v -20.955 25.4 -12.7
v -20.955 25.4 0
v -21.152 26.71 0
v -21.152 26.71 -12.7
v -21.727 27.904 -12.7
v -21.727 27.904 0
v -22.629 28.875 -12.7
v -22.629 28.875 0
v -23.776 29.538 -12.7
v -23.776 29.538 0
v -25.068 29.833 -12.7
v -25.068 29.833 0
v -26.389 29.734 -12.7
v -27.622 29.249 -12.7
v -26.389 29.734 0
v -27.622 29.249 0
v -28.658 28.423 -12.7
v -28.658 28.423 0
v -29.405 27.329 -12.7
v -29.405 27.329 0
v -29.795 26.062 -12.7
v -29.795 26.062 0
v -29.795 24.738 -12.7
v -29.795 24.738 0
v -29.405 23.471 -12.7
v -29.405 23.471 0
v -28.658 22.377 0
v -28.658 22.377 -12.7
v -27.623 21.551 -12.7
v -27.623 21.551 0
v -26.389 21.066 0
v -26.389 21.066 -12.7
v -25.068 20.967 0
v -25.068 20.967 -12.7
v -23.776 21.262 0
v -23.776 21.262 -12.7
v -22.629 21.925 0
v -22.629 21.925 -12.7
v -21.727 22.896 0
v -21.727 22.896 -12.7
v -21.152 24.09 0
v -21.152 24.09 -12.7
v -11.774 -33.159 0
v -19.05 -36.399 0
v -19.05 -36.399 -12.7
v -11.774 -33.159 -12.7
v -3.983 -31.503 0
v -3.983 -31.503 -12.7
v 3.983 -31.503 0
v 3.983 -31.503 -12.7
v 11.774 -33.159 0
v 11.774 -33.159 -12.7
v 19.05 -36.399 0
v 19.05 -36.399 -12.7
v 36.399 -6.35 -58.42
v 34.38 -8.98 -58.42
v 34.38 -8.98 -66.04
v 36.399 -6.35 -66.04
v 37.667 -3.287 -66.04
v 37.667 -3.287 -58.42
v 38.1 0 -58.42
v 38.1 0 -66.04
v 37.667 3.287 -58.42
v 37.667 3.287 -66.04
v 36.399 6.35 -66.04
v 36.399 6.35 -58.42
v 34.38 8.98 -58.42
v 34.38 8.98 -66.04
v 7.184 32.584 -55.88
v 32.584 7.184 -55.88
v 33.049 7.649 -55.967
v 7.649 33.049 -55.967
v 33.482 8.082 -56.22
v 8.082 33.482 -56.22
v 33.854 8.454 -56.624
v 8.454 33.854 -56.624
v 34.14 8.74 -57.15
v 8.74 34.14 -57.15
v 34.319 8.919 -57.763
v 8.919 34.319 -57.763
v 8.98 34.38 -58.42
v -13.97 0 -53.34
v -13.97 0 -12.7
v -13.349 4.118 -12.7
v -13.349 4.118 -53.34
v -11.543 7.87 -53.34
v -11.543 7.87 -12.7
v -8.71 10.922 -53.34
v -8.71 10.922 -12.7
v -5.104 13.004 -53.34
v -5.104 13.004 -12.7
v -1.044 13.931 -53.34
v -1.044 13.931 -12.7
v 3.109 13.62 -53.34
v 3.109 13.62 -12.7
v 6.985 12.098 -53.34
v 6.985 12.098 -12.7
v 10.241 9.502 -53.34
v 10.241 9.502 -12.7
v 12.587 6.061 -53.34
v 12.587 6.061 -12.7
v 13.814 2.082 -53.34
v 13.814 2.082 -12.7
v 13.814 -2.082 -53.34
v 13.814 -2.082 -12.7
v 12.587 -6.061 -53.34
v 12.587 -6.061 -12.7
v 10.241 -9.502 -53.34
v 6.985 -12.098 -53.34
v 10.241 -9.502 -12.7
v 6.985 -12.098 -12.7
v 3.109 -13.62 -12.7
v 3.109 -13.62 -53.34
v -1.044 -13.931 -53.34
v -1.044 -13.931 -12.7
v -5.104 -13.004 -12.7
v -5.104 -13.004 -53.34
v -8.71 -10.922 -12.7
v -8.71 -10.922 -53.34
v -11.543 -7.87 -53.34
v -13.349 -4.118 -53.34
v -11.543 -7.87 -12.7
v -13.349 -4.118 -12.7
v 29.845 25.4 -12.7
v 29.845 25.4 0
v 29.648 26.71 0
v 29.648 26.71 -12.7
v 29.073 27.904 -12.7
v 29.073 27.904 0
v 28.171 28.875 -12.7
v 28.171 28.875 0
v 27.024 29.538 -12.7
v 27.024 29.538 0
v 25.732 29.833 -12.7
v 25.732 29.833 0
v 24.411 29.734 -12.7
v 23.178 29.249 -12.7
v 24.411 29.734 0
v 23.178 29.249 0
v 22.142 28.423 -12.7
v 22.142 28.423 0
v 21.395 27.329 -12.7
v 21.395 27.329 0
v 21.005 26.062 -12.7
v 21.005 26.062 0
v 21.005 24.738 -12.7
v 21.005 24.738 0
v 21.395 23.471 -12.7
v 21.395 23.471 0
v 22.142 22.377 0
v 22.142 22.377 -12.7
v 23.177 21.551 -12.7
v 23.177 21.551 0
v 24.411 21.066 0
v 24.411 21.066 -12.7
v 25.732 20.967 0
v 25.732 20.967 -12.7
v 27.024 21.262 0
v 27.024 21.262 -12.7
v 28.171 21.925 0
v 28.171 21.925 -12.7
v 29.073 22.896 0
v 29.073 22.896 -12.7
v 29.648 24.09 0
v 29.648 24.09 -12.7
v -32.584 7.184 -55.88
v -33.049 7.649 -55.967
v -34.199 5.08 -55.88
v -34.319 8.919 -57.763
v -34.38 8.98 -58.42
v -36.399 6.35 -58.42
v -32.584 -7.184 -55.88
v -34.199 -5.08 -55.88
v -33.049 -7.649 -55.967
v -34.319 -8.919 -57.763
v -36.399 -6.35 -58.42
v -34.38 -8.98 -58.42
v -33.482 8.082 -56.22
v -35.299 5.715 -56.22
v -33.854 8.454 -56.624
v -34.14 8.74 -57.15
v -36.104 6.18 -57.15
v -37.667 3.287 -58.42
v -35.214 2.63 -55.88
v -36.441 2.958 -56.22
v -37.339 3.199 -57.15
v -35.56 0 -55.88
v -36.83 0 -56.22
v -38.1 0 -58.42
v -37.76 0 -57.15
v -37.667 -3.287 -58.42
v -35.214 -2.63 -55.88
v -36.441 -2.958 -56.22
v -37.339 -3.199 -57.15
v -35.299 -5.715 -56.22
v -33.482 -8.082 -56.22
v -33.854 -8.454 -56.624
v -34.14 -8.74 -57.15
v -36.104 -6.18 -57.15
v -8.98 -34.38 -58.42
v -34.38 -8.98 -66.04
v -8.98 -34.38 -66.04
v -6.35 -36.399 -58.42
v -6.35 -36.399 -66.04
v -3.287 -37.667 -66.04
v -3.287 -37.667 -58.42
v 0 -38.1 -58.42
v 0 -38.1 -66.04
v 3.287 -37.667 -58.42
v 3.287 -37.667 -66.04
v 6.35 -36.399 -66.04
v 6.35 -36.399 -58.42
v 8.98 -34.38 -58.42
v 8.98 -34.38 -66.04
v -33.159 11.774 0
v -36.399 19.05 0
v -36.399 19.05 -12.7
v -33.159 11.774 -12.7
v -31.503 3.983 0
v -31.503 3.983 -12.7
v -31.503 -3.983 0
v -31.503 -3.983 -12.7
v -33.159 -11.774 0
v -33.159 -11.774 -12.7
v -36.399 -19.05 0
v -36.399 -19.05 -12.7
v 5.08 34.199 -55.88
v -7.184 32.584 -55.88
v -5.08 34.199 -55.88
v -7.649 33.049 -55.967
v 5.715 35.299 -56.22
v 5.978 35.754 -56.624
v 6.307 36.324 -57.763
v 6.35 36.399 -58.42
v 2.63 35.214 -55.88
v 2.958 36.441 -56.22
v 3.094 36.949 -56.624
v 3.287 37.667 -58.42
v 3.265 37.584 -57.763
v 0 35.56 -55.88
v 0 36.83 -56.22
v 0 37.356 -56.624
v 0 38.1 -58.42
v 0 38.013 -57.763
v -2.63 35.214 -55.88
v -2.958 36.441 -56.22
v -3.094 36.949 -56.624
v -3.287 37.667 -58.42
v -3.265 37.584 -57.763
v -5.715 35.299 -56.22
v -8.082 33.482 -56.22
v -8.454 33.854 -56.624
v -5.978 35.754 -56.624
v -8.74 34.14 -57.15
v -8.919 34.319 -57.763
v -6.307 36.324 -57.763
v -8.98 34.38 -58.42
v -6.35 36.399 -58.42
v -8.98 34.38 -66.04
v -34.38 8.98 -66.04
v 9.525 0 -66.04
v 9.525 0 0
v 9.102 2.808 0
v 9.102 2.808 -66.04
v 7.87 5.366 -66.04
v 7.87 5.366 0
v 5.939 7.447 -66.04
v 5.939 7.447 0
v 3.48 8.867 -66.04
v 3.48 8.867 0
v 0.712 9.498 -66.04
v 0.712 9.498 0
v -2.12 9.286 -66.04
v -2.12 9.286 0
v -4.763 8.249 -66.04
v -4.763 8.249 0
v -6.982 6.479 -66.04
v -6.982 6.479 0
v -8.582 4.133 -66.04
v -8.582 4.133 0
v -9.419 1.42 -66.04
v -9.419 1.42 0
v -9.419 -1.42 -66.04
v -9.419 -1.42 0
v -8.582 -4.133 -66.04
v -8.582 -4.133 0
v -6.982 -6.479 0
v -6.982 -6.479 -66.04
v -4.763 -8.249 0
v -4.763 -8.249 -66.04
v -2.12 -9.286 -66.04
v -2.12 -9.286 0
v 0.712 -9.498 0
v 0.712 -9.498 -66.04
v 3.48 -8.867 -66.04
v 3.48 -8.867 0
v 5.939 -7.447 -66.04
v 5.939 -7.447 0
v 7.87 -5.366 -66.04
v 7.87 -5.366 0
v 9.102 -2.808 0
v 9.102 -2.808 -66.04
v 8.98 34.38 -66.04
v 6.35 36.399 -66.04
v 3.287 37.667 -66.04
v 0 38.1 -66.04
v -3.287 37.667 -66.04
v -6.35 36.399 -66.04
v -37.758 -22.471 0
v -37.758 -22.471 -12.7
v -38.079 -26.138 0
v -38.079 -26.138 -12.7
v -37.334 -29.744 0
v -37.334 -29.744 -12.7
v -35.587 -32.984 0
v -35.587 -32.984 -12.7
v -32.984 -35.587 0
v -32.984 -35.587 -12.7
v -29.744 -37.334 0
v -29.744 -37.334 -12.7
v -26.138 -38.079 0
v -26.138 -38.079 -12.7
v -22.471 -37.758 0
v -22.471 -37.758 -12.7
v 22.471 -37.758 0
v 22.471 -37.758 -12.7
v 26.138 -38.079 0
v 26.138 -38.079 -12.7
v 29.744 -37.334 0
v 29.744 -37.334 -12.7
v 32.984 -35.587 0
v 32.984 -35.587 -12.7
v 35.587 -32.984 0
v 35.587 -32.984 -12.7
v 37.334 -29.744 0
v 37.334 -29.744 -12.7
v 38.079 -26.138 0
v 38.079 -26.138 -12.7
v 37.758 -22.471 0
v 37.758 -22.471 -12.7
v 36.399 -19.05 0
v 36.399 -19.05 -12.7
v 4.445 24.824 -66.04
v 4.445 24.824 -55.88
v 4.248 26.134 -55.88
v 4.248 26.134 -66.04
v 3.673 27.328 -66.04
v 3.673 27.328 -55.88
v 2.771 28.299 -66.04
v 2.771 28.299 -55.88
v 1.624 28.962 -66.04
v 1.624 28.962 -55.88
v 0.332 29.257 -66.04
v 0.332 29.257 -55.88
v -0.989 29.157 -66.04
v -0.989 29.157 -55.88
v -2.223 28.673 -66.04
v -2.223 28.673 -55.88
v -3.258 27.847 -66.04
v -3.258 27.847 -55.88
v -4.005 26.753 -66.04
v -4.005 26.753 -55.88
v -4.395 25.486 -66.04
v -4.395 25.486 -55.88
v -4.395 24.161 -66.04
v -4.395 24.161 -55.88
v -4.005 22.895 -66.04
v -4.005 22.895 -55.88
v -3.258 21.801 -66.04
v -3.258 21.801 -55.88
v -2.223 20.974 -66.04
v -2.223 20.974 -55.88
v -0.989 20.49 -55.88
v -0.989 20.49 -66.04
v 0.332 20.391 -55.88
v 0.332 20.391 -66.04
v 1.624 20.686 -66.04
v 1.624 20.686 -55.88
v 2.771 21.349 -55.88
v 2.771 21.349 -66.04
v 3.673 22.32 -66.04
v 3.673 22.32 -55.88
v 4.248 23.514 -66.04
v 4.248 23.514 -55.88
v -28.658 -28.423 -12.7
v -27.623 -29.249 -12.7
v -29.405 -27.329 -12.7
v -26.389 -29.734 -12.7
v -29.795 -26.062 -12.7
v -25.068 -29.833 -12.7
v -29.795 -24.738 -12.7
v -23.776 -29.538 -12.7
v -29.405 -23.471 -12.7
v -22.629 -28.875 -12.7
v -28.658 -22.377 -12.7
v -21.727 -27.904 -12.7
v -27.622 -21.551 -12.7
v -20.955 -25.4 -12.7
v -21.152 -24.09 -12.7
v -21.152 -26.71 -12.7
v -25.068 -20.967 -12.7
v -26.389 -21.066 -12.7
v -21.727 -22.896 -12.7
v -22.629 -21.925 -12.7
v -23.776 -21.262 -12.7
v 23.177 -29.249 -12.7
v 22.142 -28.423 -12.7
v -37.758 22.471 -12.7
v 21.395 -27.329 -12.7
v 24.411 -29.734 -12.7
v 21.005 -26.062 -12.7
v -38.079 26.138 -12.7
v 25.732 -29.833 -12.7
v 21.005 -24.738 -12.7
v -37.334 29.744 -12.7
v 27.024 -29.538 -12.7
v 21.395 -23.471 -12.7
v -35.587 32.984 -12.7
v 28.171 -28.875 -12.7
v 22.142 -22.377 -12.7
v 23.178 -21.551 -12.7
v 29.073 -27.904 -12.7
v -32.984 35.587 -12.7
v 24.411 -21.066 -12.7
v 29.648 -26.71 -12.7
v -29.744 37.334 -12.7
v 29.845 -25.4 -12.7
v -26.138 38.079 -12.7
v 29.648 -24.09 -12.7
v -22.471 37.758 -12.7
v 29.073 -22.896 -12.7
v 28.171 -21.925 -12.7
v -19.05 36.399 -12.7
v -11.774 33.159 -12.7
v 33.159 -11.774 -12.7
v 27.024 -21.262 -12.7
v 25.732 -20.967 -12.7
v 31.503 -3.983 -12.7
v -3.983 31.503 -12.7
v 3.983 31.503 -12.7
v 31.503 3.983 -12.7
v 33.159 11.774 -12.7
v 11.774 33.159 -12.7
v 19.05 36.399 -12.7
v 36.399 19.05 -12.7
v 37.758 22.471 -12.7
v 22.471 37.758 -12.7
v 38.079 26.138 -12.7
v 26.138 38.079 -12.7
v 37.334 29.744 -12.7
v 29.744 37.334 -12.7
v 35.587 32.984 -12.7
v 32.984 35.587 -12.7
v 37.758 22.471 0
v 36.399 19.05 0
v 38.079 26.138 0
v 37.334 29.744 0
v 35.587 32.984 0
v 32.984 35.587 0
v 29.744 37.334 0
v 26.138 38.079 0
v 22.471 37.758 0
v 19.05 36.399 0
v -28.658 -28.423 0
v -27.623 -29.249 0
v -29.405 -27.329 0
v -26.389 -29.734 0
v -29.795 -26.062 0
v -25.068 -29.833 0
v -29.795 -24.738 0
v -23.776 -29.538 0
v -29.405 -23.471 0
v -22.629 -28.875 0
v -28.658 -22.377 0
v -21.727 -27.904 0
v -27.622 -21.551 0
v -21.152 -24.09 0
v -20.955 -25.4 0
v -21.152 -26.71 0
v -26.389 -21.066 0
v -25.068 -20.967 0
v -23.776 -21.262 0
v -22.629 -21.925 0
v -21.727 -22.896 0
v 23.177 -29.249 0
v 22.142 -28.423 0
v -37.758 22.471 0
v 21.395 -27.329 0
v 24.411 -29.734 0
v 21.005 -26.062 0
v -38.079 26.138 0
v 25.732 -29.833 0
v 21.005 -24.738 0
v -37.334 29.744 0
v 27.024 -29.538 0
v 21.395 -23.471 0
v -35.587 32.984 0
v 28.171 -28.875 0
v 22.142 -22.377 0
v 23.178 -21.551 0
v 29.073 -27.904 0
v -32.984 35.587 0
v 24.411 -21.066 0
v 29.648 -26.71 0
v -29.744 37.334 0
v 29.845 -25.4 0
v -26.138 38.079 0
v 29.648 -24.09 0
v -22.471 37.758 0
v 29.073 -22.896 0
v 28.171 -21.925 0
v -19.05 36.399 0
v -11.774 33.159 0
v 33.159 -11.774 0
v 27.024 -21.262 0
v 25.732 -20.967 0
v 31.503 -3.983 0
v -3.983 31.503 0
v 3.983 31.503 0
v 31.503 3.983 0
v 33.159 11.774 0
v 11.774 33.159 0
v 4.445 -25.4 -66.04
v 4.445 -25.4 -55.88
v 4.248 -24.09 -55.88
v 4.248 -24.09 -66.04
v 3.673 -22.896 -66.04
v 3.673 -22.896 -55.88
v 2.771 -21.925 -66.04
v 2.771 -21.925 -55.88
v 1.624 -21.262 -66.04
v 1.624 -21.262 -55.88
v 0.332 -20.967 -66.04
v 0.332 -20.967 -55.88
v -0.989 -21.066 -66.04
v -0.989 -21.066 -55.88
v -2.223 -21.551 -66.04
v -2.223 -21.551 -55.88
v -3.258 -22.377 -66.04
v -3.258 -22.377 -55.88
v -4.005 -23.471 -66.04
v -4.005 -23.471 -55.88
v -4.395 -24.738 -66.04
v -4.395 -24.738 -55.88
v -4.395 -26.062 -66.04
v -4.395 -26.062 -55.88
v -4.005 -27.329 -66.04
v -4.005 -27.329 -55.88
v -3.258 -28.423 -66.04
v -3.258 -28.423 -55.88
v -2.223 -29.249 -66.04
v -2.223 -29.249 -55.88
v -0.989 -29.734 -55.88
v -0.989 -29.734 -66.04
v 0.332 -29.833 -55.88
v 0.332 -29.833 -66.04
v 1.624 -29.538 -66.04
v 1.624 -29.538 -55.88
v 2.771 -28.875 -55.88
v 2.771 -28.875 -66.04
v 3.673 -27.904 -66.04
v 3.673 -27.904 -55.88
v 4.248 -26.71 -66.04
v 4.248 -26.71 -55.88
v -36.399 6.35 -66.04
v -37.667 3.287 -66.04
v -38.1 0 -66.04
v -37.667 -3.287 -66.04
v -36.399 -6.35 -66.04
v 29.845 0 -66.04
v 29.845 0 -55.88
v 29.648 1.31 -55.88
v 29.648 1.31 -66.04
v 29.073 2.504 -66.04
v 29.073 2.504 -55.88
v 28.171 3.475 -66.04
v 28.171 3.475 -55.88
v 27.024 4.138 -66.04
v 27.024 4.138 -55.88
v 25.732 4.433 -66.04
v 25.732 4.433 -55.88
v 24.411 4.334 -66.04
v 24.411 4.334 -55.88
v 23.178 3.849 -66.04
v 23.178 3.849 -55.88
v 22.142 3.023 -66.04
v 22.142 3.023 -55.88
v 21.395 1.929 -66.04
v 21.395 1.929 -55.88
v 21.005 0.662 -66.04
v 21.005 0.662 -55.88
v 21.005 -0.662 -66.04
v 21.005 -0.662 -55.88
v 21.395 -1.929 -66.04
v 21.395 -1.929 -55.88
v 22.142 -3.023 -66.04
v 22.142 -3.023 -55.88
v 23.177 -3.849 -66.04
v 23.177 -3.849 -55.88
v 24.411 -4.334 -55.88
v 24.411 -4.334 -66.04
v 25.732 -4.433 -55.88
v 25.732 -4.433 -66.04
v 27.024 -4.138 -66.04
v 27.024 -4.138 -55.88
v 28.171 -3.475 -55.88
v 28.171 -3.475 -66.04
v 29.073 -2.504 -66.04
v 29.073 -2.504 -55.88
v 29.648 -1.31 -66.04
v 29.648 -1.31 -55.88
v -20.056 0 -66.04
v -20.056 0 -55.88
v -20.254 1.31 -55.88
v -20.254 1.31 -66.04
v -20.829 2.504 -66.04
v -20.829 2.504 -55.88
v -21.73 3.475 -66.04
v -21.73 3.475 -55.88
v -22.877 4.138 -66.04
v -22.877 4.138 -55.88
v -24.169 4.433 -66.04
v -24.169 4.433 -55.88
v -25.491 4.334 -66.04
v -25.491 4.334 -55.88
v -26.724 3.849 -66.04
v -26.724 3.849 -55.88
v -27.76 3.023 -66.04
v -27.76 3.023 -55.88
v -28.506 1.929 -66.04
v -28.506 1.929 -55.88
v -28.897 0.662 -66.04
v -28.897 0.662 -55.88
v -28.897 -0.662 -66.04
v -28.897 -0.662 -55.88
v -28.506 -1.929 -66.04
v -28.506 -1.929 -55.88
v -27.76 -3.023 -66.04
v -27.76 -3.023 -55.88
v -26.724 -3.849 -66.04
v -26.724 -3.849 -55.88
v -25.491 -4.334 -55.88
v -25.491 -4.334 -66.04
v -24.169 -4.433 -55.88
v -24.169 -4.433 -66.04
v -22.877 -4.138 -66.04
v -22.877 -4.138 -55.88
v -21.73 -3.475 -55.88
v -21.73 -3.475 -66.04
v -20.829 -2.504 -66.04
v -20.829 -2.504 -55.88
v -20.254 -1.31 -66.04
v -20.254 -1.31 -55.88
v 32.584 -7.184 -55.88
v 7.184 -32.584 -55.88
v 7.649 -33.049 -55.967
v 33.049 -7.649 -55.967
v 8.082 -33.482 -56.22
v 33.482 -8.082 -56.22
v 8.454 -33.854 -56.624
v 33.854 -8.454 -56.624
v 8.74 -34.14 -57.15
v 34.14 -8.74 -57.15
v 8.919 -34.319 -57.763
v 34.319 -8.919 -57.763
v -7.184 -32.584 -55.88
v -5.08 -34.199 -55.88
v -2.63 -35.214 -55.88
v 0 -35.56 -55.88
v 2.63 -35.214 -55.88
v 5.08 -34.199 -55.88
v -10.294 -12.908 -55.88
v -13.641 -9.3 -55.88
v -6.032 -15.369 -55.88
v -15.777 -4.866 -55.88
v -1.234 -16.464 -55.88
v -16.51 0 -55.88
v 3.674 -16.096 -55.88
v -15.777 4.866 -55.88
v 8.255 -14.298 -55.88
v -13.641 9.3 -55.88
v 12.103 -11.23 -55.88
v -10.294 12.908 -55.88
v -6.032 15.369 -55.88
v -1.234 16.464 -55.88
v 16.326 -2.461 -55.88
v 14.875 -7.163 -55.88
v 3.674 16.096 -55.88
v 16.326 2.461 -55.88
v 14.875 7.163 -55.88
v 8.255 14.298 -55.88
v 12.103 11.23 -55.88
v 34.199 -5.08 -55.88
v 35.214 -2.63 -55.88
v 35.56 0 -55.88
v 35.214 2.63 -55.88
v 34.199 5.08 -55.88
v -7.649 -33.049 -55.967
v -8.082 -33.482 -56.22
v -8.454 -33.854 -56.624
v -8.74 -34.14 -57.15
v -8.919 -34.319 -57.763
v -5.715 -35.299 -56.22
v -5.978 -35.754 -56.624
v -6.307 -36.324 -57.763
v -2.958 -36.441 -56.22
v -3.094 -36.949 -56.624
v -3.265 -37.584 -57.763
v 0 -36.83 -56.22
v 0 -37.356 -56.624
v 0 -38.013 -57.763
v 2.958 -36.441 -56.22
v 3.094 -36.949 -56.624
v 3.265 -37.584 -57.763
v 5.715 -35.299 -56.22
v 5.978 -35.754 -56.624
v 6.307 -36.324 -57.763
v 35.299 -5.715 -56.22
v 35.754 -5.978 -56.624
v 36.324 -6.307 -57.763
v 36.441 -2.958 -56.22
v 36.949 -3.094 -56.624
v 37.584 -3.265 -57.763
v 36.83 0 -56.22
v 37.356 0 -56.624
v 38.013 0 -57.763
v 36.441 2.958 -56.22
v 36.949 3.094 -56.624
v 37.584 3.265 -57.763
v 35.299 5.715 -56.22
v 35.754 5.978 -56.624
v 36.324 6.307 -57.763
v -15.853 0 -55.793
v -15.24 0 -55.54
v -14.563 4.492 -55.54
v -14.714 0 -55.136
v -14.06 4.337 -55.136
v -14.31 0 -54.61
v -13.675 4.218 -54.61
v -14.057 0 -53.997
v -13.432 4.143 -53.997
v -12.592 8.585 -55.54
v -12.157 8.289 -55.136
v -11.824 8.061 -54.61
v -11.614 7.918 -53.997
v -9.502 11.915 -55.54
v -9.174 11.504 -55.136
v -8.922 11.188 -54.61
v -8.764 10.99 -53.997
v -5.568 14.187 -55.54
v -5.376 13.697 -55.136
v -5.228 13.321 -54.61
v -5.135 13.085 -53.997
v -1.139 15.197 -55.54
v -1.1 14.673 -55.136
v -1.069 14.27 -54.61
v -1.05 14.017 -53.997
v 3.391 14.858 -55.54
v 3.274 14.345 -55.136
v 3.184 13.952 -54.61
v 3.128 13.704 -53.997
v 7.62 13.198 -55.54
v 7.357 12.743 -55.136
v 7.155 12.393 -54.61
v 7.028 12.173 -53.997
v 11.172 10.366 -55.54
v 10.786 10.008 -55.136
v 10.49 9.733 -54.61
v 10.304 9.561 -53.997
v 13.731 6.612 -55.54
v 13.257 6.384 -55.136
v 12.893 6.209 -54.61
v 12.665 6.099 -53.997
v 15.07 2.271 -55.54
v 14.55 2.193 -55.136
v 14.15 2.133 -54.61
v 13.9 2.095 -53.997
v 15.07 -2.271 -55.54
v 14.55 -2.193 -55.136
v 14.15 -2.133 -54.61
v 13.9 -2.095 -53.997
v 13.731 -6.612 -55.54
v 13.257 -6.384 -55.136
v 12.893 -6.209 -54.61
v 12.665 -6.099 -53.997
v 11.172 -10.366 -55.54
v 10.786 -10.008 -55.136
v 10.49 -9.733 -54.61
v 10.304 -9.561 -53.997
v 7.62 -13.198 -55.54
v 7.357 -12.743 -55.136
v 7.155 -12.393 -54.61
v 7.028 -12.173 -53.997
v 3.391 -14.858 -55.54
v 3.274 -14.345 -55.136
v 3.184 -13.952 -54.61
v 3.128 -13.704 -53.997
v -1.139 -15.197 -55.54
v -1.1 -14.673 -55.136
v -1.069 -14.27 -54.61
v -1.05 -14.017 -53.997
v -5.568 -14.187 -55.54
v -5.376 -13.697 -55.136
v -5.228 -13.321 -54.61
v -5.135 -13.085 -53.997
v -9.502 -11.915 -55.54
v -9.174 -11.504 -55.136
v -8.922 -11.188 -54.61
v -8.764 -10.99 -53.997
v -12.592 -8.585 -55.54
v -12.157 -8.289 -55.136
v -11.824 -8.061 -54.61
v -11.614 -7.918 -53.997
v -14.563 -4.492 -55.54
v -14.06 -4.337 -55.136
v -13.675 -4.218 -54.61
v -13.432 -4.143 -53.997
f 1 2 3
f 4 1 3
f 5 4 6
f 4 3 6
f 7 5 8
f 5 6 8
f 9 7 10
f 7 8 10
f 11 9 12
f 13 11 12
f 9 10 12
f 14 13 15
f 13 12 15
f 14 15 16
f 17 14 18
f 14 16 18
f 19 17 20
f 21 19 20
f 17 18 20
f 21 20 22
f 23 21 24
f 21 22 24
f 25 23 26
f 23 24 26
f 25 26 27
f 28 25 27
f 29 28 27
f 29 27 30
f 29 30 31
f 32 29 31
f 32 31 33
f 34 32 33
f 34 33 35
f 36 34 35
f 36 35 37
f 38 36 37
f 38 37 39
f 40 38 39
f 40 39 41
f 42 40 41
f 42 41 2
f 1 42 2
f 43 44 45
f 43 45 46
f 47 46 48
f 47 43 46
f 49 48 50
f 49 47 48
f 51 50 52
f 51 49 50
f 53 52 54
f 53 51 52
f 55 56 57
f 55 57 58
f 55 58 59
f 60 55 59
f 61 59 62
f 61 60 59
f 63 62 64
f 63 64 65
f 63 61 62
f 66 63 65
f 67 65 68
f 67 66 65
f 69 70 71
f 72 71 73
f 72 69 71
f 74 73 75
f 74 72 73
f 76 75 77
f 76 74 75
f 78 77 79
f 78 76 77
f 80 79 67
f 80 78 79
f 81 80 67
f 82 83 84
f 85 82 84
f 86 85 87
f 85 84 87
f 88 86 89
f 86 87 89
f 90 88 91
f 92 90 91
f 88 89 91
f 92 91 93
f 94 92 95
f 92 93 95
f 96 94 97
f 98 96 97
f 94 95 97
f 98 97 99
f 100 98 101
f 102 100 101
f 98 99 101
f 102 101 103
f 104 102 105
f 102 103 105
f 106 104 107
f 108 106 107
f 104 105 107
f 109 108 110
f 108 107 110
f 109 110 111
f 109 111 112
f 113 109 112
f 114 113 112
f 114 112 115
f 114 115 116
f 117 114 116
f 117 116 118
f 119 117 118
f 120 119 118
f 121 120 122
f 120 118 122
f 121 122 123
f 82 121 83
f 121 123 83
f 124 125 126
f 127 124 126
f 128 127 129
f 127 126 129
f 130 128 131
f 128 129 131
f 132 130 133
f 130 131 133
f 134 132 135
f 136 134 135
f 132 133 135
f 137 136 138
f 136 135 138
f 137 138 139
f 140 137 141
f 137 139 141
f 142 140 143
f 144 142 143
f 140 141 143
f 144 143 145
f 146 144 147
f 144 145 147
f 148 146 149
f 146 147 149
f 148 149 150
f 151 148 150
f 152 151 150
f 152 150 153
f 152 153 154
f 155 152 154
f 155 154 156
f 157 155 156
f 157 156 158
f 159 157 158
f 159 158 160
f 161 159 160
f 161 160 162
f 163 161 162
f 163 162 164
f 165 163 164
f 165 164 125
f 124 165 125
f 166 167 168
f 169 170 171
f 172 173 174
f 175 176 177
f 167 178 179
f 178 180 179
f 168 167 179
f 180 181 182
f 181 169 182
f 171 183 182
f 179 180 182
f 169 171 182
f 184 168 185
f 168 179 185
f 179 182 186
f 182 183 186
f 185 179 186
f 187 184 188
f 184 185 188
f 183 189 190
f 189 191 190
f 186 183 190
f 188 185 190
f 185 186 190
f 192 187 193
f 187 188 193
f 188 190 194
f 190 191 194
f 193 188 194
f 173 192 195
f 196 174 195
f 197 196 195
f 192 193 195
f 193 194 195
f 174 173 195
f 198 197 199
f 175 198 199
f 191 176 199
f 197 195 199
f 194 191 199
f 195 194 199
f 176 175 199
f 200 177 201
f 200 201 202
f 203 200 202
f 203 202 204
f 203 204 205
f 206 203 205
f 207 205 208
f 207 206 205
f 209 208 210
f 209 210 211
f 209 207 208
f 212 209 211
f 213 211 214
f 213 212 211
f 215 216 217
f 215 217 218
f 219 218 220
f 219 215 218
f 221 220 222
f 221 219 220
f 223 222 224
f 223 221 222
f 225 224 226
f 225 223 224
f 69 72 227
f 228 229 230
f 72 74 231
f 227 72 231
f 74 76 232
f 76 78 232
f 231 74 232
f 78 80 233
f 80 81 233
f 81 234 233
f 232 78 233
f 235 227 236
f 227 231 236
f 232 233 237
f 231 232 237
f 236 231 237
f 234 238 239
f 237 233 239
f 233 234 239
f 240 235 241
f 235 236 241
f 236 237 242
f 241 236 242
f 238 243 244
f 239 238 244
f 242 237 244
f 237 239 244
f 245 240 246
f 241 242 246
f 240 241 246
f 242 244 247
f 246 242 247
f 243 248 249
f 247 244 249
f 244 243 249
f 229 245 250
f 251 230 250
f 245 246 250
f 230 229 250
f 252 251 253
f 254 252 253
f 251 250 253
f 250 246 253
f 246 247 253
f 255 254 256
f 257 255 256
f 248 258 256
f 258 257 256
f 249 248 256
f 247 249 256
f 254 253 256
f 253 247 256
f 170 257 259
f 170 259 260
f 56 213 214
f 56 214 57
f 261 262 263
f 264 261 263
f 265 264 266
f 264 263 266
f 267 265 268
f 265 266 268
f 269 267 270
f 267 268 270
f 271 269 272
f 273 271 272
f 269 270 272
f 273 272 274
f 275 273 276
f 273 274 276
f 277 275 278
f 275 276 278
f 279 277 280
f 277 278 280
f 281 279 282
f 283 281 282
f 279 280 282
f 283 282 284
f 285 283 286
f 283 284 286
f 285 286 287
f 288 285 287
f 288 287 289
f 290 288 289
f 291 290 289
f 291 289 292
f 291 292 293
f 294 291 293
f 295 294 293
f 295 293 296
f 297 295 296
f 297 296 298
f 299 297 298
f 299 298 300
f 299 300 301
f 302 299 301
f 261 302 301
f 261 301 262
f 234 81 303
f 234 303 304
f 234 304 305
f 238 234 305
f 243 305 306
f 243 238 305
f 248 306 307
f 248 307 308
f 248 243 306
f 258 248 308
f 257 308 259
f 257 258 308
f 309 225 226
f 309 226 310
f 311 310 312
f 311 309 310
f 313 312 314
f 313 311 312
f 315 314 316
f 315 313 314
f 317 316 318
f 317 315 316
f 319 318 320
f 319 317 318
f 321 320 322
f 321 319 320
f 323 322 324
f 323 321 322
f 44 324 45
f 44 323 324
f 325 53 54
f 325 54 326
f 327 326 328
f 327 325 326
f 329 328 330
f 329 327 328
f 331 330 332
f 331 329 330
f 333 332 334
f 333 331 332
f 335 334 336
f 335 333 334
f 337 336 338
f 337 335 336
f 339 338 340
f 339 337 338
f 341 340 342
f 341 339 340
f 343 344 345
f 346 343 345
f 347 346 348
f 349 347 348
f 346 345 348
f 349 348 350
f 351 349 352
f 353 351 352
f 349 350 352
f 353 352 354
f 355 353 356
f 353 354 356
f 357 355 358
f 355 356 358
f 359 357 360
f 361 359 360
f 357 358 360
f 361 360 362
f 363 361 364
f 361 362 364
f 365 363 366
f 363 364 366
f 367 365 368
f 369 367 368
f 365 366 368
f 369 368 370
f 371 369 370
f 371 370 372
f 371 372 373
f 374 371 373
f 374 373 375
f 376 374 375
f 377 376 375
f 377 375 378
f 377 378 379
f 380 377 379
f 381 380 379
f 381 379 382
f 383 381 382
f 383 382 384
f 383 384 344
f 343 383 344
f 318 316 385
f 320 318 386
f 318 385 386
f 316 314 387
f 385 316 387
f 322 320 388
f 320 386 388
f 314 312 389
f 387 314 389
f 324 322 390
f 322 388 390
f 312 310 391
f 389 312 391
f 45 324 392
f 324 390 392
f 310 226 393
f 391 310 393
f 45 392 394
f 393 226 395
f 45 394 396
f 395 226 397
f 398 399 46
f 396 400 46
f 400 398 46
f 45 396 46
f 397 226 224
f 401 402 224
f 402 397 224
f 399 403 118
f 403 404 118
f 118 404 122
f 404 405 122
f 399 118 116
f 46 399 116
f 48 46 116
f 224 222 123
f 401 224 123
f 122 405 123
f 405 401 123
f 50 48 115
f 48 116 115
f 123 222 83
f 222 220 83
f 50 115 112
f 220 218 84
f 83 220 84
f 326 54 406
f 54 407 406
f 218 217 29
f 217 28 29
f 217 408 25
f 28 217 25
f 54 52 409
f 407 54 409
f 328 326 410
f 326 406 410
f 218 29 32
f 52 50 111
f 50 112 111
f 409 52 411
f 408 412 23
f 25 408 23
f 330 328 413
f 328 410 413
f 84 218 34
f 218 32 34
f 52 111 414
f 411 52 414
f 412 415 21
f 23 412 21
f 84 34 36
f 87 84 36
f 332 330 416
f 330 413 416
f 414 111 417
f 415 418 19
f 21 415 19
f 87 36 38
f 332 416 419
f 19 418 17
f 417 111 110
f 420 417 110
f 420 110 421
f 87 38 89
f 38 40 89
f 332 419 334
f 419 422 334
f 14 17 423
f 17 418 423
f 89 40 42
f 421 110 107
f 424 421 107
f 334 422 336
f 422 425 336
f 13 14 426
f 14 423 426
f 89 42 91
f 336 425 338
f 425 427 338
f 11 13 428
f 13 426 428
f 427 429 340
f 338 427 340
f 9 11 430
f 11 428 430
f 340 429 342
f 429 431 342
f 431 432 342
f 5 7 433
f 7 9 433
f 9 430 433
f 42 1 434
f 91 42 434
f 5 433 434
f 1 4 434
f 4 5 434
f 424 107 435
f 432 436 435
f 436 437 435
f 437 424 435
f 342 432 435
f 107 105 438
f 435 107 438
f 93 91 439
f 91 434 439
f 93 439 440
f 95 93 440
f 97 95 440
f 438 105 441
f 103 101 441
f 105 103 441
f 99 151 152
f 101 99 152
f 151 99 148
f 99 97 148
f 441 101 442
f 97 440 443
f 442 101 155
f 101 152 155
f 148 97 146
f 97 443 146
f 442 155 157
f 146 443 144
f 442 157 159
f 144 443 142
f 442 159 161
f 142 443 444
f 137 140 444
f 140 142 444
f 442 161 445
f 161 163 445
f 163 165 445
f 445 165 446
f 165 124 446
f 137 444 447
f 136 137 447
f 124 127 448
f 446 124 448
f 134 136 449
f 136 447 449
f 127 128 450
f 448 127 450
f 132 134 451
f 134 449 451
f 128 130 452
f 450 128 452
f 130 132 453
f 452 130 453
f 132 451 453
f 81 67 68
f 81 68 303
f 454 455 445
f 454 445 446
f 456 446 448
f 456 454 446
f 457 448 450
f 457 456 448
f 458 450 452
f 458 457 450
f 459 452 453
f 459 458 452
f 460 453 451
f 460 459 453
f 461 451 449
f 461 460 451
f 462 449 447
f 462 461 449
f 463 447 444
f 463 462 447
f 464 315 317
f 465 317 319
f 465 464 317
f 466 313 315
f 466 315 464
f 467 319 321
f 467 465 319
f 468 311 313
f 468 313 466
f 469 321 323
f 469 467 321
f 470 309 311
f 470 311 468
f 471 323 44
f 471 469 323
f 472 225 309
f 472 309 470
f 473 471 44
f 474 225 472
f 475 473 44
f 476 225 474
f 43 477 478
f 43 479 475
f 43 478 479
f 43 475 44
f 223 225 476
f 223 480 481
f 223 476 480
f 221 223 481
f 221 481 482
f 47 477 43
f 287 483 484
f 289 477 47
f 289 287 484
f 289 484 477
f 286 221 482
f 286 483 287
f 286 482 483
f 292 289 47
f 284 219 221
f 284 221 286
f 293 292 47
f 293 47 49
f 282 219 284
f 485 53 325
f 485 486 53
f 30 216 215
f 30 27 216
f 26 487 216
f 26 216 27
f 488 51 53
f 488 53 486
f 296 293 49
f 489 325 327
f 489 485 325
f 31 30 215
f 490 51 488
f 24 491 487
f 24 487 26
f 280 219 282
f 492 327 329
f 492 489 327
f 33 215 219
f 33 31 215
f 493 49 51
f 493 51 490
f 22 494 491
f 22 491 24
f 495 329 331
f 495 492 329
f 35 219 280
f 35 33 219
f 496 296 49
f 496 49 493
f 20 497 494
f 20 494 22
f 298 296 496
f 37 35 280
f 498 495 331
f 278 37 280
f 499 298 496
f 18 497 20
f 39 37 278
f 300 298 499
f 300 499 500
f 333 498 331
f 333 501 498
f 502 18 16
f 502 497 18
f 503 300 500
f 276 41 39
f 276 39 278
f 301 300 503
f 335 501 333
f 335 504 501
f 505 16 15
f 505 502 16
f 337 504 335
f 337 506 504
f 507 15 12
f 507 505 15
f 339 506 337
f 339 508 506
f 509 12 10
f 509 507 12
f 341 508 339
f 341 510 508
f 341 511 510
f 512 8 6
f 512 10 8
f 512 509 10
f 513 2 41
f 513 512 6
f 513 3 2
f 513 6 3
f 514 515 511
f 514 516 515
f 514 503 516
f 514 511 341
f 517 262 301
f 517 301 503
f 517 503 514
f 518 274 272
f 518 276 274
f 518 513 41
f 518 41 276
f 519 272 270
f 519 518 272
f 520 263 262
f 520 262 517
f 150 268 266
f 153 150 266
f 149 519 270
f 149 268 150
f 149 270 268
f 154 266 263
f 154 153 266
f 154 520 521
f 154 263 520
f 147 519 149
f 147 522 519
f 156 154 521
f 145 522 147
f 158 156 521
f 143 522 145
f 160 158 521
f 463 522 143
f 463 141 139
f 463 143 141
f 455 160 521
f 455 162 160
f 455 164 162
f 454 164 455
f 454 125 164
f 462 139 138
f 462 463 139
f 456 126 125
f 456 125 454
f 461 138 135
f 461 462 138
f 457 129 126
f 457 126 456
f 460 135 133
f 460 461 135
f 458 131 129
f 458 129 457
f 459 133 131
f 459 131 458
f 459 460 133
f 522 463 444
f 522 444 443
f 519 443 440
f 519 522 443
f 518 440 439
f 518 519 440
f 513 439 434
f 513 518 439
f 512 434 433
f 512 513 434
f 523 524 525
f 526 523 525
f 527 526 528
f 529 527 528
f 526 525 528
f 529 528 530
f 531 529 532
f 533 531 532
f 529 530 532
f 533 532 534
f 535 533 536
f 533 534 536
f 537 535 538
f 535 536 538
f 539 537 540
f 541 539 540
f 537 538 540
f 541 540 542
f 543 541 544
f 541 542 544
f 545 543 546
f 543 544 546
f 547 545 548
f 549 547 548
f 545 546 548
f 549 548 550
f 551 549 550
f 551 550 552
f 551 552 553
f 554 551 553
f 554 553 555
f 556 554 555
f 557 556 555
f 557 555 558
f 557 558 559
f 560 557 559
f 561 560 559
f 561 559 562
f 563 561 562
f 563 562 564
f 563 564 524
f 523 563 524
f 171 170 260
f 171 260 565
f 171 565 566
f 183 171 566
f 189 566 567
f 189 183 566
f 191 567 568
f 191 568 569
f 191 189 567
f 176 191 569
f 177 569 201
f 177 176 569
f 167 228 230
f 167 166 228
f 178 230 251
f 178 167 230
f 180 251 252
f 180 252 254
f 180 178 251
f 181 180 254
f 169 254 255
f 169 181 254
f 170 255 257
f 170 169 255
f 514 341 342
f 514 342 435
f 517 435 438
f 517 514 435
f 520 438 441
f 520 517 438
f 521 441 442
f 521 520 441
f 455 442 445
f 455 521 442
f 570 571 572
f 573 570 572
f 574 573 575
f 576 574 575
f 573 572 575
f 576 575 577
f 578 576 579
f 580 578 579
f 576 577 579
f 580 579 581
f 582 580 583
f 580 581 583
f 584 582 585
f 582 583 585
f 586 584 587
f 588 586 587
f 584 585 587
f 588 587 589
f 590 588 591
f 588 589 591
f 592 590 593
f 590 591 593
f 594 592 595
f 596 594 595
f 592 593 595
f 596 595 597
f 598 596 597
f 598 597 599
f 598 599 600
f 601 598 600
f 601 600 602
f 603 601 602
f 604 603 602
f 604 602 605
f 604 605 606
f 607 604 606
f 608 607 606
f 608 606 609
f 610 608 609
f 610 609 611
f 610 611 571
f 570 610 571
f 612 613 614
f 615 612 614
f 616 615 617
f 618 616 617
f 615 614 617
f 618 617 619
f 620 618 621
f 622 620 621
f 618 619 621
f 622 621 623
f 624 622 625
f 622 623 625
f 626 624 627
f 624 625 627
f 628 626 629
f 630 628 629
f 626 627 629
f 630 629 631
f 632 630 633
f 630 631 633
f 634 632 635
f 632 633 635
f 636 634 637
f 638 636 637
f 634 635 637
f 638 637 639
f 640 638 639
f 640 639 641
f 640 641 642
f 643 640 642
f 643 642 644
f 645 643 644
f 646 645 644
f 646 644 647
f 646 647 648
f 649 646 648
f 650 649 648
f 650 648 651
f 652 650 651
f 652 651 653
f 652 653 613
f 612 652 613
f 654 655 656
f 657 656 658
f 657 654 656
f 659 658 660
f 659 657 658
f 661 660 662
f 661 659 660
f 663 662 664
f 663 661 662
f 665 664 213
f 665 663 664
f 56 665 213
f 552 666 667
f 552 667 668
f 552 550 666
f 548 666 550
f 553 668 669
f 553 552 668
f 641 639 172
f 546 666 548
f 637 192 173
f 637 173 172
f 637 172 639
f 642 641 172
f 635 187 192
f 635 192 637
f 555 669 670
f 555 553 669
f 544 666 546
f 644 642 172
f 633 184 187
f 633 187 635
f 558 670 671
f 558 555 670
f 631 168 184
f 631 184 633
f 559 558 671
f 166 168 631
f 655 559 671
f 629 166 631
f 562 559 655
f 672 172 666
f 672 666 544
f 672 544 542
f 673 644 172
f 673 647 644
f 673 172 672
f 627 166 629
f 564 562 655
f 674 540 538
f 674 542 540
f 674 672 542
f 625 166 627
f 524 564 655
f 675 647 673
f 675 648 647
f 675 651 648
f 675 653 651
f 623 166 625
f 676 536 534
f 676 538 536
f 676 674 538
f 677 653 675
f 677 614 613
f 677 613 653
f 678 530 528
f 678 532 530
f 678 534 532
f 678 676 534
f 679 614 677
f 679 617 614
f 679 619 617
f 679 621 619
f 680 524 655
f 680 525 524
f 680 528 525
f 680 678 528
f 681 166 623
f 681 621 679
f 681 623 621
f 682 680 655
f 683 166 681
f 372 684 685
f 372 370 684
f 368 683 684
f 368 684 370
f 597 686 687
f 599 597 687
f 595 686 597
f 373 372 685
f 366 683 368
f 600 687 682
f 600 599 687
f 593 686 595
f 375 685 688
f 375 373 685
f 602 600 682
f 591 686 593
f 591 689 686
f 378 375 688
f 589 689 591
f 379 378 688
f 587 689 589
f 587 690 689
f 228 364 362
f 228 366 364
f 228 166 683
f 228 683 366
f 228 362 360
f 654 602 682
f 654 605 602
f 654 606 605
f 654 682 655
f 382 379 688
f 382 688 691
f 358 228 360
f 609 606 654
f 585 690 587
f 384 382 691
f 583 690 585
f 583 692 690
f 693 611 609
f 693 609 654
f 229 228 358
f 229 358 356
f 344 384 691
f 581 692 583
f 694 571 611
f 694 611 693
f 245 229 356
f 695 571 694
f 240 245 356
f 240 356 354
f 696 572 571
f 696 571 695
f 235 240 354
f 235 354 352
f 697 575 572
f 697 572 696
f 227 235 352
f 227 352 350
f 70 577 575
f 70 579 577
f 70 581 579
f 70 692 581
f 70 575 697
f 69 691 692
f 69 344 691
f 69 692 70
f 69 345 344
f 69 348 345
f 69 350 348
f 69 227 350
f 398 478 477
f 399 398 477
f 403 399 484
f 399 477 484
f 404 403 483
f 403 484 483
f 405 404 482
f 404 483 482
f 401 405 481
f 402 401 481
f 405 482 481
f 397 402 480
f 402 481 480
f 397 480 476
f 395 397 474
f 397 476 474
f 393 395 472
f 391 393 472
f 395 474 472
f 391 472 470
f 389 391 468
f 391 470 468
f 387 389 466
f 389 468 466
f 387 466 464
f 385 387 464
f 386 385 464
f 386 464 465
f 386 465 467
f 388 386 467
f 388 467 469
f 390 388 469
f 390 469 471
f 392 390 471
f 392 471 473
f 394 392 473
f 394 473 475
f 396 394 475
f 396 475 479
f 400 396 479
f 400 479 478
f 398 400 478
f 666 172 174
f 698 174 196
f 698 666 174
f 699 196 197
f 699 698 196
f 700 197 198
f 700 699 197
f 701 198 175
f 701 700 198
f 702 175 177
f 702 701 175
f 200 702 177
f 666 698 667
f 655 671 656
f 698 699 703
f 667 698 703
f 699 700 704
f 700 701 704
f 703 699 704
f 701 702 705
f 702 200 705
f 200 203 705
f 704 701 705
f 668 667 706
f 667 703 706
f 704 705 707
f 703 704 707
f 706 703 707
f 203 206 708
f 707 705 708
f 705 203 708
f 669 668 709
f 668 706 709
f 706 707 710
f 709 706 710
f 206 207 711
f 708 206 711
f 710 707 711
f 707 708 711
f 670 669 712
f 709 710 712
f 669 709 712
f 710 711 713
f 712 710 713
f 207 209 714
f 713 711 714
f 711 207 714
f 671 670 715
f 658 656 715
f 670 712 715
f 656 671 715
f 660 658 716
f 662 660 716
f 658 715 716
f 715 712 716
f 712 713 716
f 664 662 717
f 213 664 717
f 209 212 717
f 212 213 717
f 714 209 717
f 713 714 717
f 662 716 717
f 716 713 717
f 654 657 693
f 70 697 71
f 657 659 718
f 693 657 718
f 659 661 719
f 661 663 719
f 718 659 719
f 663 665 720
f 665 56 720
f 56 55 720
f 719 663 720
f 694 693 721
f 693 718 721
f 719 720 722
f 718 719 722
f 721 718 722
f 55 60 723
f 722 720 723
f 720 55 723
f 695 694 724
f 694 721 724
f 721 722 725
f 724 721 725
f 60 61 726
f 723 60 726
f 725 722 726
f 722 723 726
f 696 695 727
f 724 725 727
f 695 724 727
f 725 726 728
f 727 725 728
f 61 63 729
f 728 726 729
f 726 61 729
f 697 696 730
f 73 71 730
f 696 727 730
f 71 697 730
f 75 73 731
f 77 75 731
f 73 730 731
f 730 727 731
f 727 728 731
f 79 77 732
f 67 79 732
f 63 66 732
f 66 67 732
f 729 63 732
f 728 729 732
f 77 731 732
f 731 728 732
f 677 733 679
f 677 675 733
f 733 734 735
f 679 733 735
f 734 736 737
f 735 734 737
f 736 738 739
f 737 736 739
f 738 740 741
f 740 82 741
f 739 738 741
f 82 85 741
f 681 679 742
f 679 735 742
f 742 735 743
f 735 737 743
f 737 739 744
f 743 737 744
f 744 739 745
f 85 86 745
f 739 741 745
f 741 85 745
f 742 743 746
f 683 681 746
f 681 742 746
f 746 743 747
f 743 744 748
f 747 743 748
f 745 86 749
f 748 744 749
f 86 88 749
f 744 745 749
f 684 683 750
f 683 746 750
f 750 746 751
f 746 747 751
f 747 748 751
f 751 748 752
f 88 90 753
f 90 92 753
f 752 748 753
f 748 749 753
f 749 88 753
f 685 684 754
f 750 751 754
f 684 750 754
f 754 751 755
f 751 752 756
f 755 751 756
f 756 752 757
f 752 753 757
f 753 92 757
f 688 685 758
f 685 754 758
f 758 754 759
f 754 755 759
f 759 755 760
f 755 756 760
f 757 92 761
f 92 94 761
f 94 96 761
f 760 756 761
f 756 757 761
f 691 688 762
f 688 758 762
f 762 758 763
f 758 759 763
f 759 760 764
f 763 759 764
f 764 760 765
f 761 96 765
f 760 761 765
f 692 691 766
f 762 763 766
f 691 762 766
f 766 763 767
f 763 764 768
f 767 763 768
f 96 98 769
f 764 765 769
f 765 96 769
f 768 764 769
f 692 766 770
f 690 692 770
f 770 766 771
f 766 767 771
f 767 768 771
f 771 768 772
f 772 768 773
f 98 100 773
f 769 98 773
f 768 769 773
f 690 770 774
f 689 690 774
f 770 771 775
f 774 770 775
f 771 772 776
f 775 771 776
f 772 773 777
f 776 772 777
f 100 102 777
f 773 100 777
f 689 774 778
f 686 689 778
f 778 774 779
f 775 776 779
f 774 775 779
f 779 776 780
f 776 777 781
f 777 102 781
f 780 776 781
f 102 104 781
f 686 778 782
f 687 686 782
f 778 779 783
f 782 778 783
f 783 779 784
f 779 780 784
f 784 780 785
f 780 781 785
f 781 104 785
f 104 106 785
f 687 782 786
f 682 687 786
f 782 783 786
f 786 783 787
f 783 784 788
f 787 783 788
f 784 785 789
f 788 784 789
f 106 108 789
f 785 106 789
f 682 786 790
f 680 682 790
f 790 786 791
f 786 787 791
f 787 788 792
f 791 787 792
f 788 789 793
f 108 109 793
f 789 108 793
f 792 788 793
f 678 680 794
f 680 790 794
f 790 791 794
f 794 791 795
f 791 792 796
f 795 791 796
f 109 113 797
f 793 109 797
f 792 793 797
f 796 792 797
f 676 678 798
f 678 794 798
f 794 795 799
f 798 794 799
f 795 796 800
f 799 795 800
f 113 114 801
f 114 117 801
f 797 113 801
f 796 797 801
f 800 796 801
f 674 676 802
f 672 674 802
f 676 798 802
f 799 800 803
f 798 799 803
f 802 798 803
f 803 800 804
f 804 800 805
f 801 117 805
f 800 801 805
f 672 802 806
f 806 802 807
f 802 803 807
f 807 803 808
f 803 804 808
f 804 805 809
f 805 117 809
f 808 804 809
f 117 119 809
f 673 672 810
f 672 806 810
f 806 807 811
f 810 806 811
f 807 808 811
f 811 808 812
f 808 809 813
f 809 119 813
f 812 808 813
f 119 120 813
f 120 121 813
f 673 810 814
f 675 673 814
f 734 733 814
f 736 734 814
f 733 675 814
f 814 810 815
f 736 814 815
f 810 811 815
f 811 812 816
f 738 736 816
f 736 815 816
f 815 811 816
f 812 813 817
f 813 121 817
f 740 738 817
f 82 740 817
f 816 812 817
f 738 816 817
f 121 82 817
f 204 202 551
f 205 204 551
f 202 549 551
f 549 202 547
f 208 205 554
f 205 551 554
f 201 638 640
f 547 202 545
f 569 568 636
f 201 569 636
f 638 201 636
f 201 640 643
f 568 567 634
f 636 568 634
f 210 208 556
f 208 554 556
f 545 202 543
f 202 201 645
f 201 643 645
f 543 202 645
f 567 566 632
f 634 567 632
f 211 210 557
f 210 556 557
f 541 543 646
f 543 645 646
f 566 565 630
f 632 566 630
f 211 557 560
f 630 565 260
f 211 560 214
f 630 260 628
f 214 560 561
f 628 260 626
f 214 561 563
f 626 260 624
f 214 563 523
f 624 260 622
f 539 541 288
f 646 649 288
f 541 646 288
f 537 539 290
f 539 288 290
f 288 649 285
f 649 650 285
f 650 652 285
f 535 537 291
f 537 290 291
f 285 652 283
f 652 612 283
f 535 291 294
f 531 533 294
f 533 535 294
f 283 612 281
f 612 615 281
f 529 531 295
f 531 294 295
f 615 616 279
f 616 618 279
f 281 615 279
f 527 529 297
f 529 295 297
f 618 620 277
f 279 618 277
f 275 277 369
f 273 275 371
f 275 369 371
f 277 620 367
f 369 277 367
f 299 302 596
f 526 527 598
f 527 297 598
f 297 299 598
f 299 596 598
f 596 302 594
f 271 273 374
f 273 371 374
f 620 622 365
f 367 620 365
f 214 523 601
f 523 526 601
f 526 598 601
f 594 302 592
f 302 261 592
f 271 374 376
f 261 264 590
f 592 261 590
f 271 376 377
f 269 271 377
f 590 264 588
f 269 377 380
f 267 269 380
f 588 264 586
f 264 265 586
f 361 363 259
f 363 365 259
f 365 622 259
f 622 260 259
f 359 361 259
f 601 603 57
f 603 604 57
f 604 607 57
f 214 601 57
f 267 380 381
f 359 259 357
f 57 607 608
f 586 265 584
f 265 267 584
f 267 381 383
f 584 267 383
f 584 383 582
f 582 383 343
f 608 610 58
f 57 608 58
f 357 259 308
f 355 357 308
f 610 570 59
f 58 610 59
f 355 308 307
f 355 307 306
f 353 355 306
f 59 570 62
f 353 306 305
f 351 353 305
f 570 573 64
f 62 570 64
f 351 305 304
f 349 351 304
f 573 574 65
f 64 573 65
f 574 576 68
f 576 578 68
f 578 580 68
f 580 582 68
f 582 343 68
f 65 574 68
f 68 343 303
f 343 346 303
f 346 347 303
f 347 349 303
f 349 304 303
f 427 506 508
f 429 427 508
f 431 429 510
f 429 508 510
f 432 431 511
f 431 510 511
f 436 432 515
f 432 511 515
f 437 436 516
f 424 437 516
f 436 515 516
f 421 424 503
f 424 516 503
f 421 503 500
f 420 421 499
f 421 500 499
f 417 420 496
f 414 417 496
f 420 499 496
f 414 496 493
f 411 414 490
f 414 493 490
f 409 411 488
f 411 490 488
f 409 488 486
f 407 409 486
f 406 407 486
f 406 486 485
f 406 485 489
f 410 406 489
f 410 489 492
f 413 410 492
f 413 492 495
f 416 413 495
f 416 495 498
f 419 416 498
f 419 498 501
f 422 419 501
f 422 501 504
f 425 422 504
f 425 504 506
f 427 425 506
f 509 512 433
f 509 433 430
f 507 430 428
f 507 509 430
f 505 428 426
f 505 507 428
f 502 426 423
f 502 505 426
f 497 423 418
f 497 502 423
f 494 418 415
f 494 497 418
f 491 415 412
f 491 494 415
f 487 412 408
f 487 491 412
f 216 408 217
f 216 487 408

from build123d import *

# Parameters (mm, degrees)
EXTRUDE_1_DEPTH     = 12.7
SKETCH_2_R          = 13.97
EXTRUDE_2_DEPTH     = 43.18
EXTRUDE_3_DEPTH     = 10.16
SKETCH_5_R          = 9.525
CUT_EXTRUDE_1_DEPTH = 86.232045617
CUT_EXTRUDE_2_REACH = 87.232
SKETCH_6_R          = 4.445
CUT_EXTRUDE_3_REACH = 79.626
SKETCH_7_R          = 4.445
FILLET_1_R          = 2.54


with BuildPart() as part:
    # 스케치1 → 보스-돌출1 (new body)
    with BuildSketch(Plane.XY):
        with BuildLine():
            ThreePointArc((-19.05, 36.398522628), (-34.380256121, 34.380256121), (-36.398522628, 19.05))
            ThreePointArc((-36.398522628, 19.05), (-31.294090512, 0), (-36.398522628, -19.05))
            ThreePointArc((-36.398522628, -19.05), (-34.380256121, -34.380256121), (-19.05, -36.398522628))
            ThreePointArc((-19.05, -36.398522628), (0, -31.294090512), (19.05, -36.398522628))
            ThreePointArc((19.05, -36.398522628), (34.380256121, -34.380256121), (36.398522628, -19.05))
            ThreePointArc((36.398522628, -19.05), (31.294090512, 0), (36.398522628, 19.05))
            ThreePointArc((36.398522628, 19.05), (34.380256121, 34.380256121), (19.05, 36.398522628))
            ThreePointArc((19.05, 36.398522628), (0, 31.294090512), (-19.05, 36.398522628))
        make_face()
    extrude(amount=-EXTRUDE_1_DEPTH)

    # 스케치2 → 보스-돌출2 (add)
    with BuildSketch(Plane(origin=(0, 0, -12.7), x_dir=(-1, 0, 0), z_dir=(0, 0, -1))):
        Circle(SKETCH_2_R)
    extrude(amount=EXTRUDE_2_DEPTH)

    # 스케치4 → 보스-돌출3 (add)
    with BuildSketch(Plane(origin=(0, 0, -55.88), x_dir=(-1, 0, 0), z_dir=(0, 0, -1))):
        with BuildLine():
            Line((-34.380256121, 8.980256121), (-8.980256121, 34.380256121))
            ThreePointArc((-8.980256121, 34.380256121), (0, 38.1), (8.980256121, 34.380256121))
            Line((8.980256121, 34.380256121), (34.380256121, 8.980256121))
            ThreePointArc((34.380256121, 8.980256121), (38.1, 0), (34.380256121, -8.980256121))
            Line((34.380256121, -8.980256121), (8.980256121, -34.380256121))
            ThreePointArc((8.980256121, -34.380256121), (0, -38.1), (-8.980256121, -34.380256121))
            Line((-8.980256121, -34.380256121), (-34.380256121, -8.980256121))
            ThreePointArc((-34.380256121, -8.980256121), (-38.1, 0), (-34.380256121, 8.980256121))
        make_face()
    extrude(amount=EXTRUDE_3_DEPTH)

    # 스케치5 → 컷-돌출1 (cut, through all)
    with BuildSketch(Plane.XY):
        Circle(SKETCH_5_R)
    extrude(amount=-CUT_EXTRUDE_1_DEPTH, mode=Mode.SUBTRACT)

    # 스케치6 → 컷-돌출2 (cut, up to next)
    with BuildSketch(Plane.XY, mode=Mode.PRIVATE) as cut_extrude_2_sk1:
        with Locations((-25.4, 25.4)):
            Circle(SKETCH_6_R)
    cut_extrude_2_tool1 = extrude(cut_extrude_2_sk1.sketch, amount=-CUT_EXTRUDE_2_REACH, mode=Mode.PRIVATE) & part.part
    # 스케치6 → 컷-돌출2 (cut, up to next)
    with BuildSketch(Plane.XY, mode=Mode.PRIVATE) as cut_extrude_2_sk2:
        with Locations((-25.4, -25.4)):
            Circle(SKETCH_6_R)
    cut_extrude_2_tool2 = extrude(cut_extrude_2_sk2.sketch, amount=-CUT_EXTRUDE_2_REACH, mode=Mode.PRIVATE) & part.part
    # 스케치6 → 컷-돌출2 (cut, up to next)
    with BuildSketch(Plane.XY, mode=Mode.PRIVATE) as cut_extrude_2_sk3:
        with Locations((25.4, -25.4)):
            Circle(SKETCH_6_R)
    cut_extrude_2_tool3 = extrude(cut_extrude_2_sk3.sketch, amount=-CUT_EXTRUDE_2_REACH, mode=Mode.PRIVATE) & part.part
    # 스케치6 → 컷-돌출2 (cut, up to next)
    with BuildSketch(Plane.XY, mode=Mode.PRIVATE) as cut_extrude_2_sk4:
        with Locations((25.4, 25.4)):
            Circle(SKETCH_6_R)
    cut_extrude_2_tool4 = extrude(cut_extrude_2_sk4.sketch, amount=-CUT_EXTRUDE_2_REACH, mode=Mode.PRIVATE) & part.part
    add(cut_extrude_2_tool1.solids().sort_by_distance((-25.4, 25.4, 0))[0], mode=Mode.SUBTRACT)
    add(cut_extrude_2_tool2.solids().sort_by_distance((-25.4, -25.4, 0))[0], mode=Mode.SUBTRACT)
    add(cut_extrude_2_tool3.solids().sort_by_distance((25.4, -25.4, 0))[0], mode=Mode.SUBTRACT)
    add(cut_extrude_2_tool4.solids().sort_by_distance((25.4, 25.4, 0))[0], mode=Mode.SUBTRACT)

    # 스케치7 → 컷-돌출3 (cut, up to next)
    with BuildSketch(Plane.XY.offset(-55.88), mode=Mode.PRIVATE) as cut_extrude_3_sk1:
        with Locations((0, 24.823944536)):
            Circle(SKETCH_7_R)
    cut_extrude_3_tool1 = extrude(cut_extrude_3_sk1.sketch, amount=-CUT_EXTRUDE_3_REACH, mode=Mode.PRIVATE) & part.part
    # 스케치7 → 컷-돌출3 (cut, up to next)
    with BuildSketch(Plane.XY.offset(-55.88), mode=Mode.PRIVATE) as cut_extrude_3_sk2:
        with Locations((25.4, 0)):
            Circle(SKETCH_7_R)
    cut_extrude_3_tool2 = extrude(cut_extrude_3_sk2.sketch, amount=-CUT_EXTRUDE_3_REACH, mode=Mode.PRIVATE) & part.part
    # 스케치7 → 컷-돌출3 (cut, up to next)
    with BuildSketch(Plane.XY.offset(-55.88), mode=Mode.PRIVATE) as cut_extrude_3_sk3:
        with Locations((0, -25.4)):
            Circle(SKETCH_7_R)
    cut_extrude_3_tool3 = extrude(cut_extrude_3_sk3.sketch, amount=-CUT_EXTRUDE_3_REACH, mode=Mode.PRIVATE) & part.part
    # 스케치7 → 컷-돌출3 (cut, up to next)
    with BuildSketch(Plane.XY.offset(-55.88), mode=Mode.PRIVATE) as cut_extrude_3_sk4:
        with Locations((-24.501420948, 0)):
            Circle(SKETCH_7_R)
    cut_extrude_3_tool4 = extrude(cut_extrude_3_sk4.sketch, amount=-CUT_EXTRUDE_3_REACH, mode=Mode.PRIVATE) & part.part
    add(cut_extrude_3_tool1.solids().sort_by_distance((0, 24.823945, -55.88))[0], mode=Mode.SUBTRACT)
    add(cut_extrude_3_tool2.solids().sort_by_distance((25.4, 0, -55.88))[0], mode=Mode.SUBTRACT)
    add(cut_extrude_3_tool3.solids().sort_by_distance((0, -25.4, -55.88))[0], mode=Mode.SUBTRACT)
    add(cut_extrude_3_tool4.solids().sort_by_distance((-24.501421, 0, -55.88))[0], mode=Mode.SUBTRACT)

    # 필렛1
    fillet_1_edges = [part.edges().sort_by_distance(p)[0] for p in [
        (13.97, 0, -55.88),
        (-38.1, 0, -55.88),
        (-21.680256121, 21.680256121, -55.88),
        (0, 38.1, -55.88),
        (21.680256121, 21.680256121, -55.88),
        (38.1, 0, -55.88),
        (21.680256121, -21.680256121, -55.88),
        (0, -38.1, -55.88),
        (-21.680256121, -21.680256121, -55.88),
    ]]
    fillet(fillet_1_edges, radius=FILLET_1_R)


solid = part.part
